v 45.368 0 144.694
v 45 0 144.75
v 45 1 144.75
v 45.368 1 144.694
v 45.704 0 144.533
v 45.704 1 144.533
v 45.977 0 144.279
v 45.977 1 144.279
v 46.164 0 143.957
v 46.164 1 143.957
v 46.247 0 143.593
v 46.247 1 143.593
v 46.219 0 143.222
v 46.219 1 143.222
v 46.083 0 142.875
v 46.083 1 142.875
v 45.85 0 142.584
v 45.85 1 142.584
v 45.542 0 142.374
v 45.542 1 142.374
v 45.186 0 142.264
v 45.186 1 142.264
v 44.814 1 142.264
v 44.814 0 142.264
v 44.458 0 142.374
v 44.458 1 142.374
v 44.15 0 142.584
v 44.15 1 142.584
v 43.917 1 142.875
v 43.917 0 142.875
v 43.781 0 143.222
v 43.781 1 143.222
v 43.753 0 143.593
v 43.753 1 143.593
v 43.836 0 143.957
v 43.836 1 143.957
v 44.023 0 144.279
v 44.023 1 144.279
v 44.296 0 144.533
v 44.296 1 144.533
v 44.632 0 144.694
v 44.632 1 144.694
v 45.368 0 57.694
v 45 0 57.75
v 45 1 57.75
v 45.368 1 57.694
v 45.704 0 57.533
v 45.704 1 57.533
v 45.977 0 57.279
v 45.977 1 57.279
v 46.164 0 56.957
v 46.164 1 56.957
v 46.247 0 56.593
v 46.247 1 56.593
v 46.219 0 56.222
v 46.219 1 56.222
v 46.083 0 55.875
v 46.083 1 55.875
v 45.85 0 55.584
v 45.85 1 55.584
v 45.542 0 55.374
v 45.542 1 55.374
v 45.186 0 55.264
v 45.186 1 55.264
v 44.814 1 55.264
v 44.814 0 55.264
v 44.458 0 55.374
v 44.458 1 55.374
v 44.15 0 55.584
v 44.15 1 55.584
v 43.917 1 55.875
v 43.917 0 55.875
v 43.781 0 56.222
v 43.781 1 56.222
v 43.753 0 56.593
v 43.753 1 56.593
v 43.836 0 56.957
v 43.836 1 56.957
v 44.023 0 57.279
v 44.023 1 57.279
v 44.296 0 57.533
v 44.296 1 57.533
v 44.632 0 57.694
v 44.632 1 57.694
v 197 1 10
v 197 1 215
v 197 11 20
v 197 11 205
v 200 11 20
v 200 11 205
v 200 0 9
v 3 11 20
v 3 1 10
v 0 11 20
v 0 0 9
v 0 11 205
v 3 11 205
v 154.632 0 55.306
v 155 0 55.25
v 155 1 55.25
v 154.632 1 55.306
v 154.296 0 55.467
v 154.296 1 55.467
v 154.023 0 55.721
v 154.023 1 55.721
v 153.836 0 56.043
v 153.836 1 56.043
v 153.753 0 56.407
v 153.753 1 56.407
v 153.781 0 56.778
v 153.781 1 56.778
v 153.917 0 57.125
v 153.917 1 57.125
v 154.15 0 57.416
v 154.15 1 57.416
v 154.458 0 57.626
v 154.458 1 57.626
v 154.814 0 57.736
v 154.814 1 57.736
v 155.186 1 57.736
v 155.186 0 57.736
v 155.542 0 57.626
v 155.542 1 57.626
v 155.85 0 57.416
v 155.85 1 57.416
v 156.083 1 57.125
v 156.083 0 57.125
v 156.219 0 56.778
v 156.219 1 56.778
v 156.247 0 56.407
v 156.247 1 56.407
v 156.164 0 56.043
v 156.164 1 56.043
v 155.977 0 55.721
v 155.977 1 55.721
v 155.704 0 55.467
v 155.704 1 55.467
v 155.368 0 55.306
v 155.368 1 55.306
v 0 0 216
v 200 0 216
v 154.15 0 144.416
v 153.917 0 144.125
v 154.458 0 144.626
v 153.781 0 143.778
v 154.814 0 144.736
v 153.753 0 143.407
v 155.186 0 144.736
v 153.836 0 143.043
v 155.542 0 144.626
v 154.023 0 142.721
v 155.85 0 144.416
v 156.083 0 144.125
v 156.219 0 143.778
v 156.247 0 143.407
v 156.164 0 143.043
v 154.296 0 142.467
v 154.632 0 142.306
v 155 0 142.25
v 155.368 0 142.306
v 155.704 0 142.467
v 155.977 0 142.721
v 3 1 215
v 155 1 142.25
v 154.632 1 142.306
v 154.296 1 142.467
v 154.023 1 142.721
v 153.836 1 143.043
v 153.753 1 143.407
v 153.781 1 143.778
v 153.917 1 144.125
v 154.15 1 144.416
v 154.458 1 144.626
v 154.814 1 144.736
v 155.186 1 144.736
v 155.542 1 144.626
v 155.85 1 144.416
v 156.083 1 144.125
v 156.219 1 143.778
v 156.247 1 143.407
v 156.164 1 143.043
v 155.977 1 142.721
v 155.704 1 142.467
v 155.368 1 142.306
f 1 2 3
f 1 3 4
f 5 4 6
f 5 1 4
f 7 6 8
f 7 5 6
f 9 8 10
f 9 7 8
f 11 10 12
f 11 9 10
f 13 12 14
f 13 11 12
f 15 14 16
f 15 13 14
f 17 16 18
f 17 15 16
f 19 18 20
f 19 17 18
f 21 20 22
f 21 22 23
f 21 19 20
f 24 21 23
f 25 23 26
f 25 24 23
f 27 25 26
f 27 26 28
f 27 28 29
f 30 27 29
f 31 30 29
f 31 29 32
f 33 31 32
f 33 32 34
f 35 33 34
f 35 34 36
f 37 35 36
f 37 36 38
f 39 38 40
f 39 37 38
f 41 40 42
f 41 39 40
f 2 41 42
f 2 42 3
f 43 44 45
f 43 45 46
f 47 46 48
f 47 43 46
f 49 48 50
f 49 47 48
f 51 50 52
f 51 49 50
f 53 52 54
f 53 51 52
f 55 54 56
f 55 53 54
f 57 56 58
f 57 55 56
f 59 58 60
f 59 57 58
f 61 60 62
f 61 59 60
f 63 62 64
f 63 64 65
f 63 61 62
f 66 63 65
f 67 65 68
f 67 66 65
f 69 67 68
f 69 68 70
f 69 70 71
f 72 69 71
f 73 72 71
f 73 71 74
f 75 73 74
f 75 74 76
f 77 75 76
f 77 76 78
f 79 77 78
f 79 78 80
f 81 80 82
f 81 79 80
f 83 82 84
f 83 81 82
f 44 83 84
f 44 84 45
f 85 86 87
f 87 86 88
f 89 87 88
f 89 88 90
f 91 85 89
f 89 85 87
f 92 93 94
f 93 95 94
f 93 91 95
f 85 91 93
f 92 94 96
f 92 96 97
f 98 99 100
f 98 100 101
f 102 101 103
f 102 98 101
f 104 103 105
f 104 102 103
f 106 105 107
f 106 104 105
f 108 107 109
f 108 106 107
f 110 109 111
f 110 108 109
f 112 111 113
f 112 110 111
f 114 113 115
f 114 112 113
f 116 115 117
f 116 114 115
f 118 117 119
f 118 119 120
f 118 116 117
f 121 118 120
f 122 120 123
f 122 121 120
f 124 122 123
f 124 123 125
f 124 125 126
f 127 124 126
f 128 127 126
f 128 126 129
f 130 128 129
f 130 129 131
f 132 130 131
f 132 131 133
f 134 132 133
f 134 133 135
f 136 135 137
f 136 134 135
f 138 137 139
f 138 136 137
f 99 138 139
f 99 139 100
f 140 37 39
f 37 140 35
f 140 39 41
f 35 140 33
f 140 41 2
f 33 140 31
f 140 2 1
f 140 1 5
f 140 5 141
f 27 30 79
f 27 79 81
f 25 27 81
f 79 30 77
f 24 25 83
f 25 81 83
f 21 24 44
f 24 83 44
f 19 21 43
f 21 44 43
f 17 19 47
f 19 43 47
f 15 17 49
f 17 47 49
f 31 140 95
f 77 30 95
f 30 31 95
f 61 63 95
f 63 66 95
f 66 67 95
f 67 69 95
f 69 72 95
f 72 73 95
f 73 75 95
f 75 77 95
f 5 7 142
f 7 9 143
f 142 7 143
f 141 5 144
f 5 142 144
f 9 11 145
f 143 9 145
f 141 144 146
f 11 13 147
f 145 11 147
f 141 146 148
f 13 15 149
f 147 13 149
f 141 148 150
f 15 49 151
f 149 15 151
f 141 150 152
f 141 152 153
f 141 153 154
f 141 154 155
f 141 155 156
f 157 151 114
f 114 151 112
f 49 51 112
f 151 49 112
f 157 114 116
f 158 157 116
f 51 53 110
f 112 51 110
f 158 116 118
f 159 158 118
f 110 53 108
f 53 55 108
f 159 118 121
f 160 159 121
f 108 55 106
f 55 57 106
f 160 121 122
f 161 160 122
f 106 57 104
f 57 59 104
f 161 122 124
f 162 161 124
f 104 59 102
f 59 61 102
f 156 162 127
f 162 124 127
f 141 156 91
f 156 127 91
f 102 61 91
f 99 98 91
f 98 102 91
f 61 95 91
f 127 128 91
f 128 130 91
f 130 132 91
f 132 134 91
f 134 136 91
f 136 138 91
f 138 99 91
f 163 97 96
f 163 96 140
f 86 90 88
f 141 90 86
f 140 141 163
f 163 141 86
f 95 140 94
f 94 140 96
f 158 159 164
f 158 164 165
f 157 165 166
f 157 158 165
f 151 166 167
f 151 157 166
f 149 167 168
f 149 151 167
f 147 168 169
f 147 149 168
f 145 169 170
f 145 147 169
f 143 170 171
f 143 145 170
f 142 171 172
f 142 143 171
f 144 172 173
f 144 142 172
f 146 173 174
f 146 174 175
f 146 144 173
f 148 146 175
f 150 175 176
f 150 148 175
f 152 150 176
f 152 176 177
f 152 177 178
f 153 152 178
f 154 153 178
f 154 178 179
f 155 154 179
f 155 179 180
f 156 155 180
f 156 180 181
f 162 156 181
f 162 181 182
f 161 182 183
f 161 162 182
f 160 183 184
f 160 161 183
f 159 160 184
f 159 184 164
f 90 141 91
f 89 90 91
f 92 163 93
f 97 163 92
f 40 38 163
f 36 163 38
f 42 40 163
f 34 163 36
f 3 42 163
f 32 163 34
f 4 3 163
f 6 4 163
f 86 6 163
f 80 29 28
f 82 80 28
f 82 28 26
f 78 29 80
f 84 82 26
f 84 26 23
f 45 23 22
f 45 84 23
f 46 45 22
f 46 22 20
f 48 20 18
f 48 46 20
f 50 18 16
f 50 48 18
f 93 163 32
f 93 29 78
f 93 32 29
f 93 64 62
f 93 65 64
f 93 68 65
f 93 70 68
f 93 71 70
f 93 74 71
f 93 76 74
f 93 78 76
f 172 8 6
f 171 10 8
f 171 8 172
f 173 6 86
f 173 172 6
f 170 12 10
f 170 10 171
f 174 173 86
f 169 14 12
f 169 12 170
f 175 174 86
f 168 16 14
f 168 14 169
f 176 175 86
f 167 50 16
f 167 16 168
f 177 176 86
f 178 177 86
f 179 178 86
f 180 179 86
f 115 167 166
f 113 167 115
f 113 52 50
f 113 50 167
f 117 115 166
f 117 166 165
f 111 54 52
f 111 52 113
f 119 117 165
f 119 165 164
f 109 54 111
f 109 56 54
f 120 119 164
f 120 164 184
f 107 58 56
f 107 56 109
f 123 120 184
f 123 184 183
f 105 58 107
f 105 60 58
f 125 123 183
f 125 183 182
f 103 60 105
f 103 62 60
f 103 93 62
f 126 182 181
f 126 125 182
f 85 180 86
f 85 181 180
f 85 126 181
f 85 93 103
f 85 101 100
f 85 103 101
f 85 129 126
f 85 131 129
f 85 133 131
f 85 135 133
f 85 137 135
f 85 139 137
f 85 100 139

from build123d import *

# Parameters (mm, degrees)
SKETCH1_W           = 200
SKETCH1_H           = 225
SKETCH1_R           = 1.25
BOSS_EXTRUDE1_DEPTH = 1
SKETCH2_W           = 3
SKETCH2_H           = 225
BOSS_EXTRUDE2_DEPTH = 10


with BuildPart() as part:
    # Sketch1 → Boss-Extrude1 (new body)
    with BuildSketch(Plane(origin=(0, 0, 0), x_dir=(1, 0, 0), z_dir=(0, 1, 0))):
        with Locations((100, -112.5)):
            Rectangle(SKETCH1_W, SKETCH1_H)
        with Locations(Location((45, -56.5, 0), (0, 0, 270))):
            Circle(SKETCH1_R, mode=Mode.SUBTRACT)
        with Locations(Location((155, -56.5, 0), (0, 0, 90))):
            Circle(SKETCH1_R, mode=Mode.SUBTRACT)
        with Locations(Location((45, -143.5, 0), (0, 0, 270))):
            Circle(SKETCH1_R, mode=Mode.SUBTRACT)
        with Locations(Location((155, -143.5, 0), (0, 0, 90))):
            Circle(SKETCH1_R, mode=Mode.SUBTRACT)
    extrude(amount=BOSS_EXTRUDE1_DEPTH)

    # Sketch2 → Boss-Extrude2 (add)
    with BuildSketch(Plane(origin=(0, 1, 0), x_dir=(1, 0, 0), z_dir=(0, 1, 0))):
        with Locations((1.5, -112.5)):
            Rectangle(SKETCH2_W, SKETCH2_H)
        with Locations((198.5, -112.5)):
            Rectangle(SKETCH2_W, SKETCH2_H)
    extrude(amount=BOSS_EXTRUDE2_DEPTH)

    # Chamfer7
    # the kernel refuses this chamfer: 20 mm, written as the material it takes off along each edge
    with BuildSketch(Plane(origin=(-123.440783422, 11, 0), x_dir=(0, -0.9996219169112968, -0.027495876610586372), z_dir=(1, 0, 0))) as chamfer7_piece_1:
        with BuildLine():
            Line((20.573463904, 0), (-1.130943098, -20.54235587))
            Line((-1.130943098, -20.54235587), (-1.530791864, -20.53135752))
            ThreePointArc((-1.530791864, -20.53135752), (-0.682584541, -10.267956593), (-0.399848767, 0.010998351))
            Line((-0.399848767, 0.010998351), (0.010998351, 0.399848767))
            ThreePointArc((0.010998351, 0.399848767), (10.289953294, 0.117112992), (20.584462254, 0.399848767))
            Line((20.584462254, 0.399848767), (20.573463904, 0))
        make_face()
    extrude(amount=249.881566845, mode=Mode.SUBTRACT)
    with BuildSketch(Plane(origin=(323.440783422, 11, 0), x_dir=(0, -0.9996219169112968, -0.027495876610586372), z_dir=(-1, 0, 0))) as chamfer7_piece_2:
        with BuildLine():
            Line((20.573463904, 0), (-1.130943098, 20.54235587))
            Line((-1.130943098, 20.54235587), (-1.530791864, 20.53135752))
            ThreePointArc((-1.530791864, 20.53135752), (-0.682584541, 10.267956593), (-0.399848767, -0.010998351))
            Line((-0.399848767, -0.010998351), (0.010998351, -0.399848767))
            ThreePointArc((0.010998351, -0.399848767), (10.289953294, -0.117112992), (20.584462254, -0.399848767))
            Line((20.584462254, -0.399848767), (20.573463904, 0))
        make_face()
    extrude(amount=249.881566845, mode=Mode.SUBTRACT)

    # Chamfer8
    # the kernel refuses this chamfer: 20 mm, written as the material it takes off along each edge
    with BuildSketch(Plane(origin=(126.440783422, 11, 225), x_dir=(0, 0.027495876610586403, -0.9996219169112968), z_dir=(-1, 0, 0))) as chamfer8_piece_1:
        with BuildLine():
            Line((20.573463904, 0), (-1.130943098, 20.54235587))
            Line((-1.130943098, 20.54235587), (-1.530791864, 20.53135752))
            ThreePointArc((-1.530791864, 20.53135752), (-0.682584541, 10.267956593), (-0.399848767, -0.010998351))
            Line((-0.399848767, -0.010998351), (0.010998351, -0.399848767))
            ThreePointArc((0.010998351, -0.399848767), (10.289953294, -0.117112992), (20.584462254, -0.399848767))
            Line((20.584462254, -0.399848767), (20.573463904, 0))
        make_face()
    extrude(amount=249.881566845, mode=Mode.SUBTRACT)
    with BuildSketch(Plane(origin=(73.559216578, 11, 225), x_dir=(0, 0.027495876610586403, -0.9996219169112968), z_dir=(1, 0, 0))) as chamfer8_piece_2:
        with BuildLine():
            Line((20.573463904, 0), (-1.130943098, -20.54235587))
            Line((-1.130943098, -20.54235587), (-1.530791864, -20.53135752))
            ThreePointArc((-1.530791864, -20.53135752), (-0.682584541, -10.267956593), (-0.399848767, 0.010998351))
            Line((-0.399848767, 0.010998351), (0.010998351, 0.399848767))
            ThreePointArc((0.010998351, 0.399848767), (10.289953294, 0.117112992), (20.584462254, 0.399848767))
            Line((20.584462254, 0.399848767), (20.573463904, 0))
        make_face()
    extrude(amount=249.881566845, mode=Mode.SUBTRACT)


solid = part.part
